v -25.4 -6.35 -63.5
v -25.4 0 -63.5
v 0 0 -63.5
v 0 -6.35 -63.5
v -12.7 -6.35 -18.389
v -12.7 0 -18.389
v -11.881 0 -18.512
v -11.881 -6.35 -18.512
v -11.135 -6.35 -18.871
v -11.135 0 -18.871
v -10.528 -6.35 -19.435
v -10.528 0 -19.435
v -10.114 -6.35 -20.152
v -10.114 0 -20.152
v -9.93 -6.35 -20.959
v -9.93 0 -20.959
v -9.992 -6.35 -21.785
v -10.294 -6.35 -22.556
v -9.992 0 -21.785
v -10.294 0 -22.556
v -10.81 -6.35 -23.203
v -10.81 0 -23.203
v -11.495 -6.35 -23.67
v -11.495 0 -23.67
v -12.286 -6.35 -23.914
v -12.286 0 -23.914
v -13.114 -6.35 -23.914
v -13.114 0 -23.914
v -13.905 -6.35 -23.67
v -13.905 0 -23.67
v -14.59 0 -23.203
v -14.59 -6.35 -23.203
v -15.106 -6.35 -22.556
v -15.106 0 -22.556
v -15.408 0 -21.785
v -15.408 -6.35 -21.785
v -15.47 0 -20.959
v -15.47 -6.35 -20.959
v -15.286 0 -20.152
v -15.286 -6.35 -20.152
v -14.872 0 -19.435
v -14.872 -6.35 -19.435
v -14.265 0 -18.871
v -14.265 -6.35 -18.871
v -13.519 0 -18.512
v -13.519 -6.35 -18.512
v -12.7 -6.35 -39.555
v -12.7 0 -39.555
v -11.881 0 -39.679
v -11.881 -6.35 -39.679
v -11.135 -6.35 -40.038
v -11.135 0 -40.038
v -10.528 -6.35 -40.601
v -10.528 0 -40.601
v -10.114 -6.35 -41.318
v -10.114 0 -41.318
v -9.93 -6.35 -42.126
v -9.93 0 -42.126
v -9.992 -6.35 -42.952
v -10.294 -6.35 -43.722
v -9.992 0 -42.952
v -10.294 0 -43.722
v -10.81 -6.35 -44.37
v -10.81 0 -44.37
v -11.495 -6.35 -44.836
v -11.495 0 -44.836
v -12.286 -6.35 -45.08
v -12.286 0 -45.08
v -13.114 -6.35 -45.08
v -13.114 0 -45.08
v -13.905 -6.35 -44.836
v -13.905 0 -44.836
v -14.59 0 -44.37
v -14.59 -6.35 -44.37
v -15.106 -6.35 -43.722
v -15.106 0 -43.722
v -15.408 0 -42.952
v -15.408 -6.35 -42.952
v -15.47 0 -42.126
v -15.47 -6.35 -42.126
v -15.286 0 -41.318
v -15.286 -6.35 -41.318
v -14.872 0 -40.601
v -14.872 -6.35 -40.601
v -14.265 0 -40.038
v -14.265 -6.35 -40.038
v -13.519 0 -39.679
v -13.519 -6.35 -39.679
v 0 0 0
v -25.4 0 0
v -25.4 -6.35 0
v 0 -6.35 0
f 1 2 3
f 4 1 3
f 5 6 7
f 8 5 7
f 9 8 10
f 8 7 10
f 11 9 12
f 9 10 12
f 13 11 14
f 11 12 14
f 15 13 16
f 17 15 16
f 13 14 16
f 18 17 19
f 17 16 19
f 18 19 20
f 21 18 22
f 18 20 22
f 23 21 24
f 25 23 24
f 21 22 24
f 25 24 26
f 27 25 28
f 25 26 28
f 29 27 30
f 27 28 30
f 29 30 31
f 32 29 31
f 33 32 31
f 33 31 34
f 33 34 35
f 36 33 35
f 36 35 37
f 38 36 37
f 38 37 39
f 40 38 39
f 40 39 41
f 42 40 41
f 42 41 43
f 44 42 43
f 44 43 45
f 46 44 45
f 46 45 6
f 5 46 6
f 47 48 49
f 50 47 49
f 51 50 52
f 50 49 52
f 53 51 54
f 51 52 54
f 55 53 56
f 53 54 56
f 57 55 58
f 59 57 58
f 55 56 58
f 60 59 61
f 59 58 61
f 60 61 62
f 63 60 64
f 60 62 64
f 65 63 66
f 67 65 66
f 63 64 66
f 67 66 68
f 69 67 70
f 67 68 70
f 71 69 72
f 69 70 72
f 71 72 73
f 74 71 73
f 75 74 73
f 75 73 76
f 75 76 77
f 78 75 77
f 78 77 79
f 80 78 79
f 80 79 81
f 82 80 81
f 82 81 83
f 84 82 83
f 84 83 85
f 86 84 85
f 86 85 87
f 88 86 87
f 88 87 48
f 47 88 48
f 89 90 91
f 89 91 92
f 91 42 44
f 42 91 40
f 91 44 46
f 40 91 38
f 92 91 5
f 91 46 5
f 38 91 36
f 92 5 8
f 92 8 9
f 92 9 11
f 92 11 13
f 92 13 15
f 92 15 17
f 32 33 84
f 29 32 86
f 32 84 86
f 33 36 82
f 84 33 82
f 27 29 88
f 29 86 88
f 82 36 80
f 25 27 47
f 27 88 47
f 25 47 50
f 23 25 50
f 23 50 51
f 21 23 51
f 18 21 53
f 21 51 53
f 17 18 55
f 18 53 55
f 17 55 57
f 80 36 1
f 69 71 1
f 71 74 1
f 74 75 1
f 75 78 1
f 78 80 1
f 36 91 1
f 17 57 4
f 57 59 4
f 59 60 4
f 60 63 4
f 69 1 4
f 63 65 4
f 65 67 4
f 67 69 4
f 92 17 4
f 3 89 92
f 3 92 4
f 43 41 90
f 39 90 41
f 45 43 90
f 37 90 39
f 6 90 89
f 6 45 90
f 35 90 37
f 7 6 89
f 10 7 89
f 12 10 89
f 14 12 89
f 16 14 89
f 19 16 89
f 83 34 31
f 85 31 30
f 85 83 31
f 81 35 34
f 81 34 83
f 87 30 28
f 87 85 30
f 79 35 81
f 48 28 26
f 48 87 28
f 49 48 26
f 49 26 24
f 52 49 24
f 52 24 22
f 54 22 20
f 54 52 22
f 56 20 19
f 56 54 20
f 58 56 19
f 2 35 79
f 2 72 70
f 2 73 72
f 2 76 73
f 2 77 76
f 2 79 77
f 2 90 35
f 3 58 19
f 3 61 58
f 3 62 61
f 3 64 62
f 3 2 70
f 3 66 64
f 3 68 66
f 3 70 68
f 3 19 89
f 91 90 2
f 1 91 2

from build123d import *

# Parameters (mm, degrees)
SKETCH1_W           = 25.4
SKETCH1_H           = 63.5
BOSS_EXTRUDE2_DEPTH = 6.35
SKETCH3_R           = 2.778125
CUT_EXTRUDE1_DEPTH  = 69.685751798


with BuildPart() as part:
    # Sketch1 → Boss-Extrude2 (new body)
    with BuildSketch(Plane(origin=(0, 0, 0), x_dir=(1, 0, 0), z_dir=(0, 1, 0))):
        with Locations((-12.7, 31.75)):
            Rectangle(SKETCH1_W, SKETCH1_H)
    extrude(amount=-BOSS_EXTRUDE2_DEPTH)

    # Sketch3 → Cut-Extrude1 (cut, through all)
    with BuildSketch(Plane(origin=(0, 0, 0), x_dir=(1, 0, 0), z_dir=(0, 1, 0))):
        with Locations(Location((-12.7, 21.166666667, 0), (0, 0, 270))):
            Circle(SKETCH3_R)
        with Locations(Location((-12.7, 42.333333333, 0), (0, 0, 270))):
            Circle(SKETCH3_R)
    extrude(amount=-CUT_EXTRUDE1_DEPTH, mode=Mode.SUBTRACT)


solid = part.part
